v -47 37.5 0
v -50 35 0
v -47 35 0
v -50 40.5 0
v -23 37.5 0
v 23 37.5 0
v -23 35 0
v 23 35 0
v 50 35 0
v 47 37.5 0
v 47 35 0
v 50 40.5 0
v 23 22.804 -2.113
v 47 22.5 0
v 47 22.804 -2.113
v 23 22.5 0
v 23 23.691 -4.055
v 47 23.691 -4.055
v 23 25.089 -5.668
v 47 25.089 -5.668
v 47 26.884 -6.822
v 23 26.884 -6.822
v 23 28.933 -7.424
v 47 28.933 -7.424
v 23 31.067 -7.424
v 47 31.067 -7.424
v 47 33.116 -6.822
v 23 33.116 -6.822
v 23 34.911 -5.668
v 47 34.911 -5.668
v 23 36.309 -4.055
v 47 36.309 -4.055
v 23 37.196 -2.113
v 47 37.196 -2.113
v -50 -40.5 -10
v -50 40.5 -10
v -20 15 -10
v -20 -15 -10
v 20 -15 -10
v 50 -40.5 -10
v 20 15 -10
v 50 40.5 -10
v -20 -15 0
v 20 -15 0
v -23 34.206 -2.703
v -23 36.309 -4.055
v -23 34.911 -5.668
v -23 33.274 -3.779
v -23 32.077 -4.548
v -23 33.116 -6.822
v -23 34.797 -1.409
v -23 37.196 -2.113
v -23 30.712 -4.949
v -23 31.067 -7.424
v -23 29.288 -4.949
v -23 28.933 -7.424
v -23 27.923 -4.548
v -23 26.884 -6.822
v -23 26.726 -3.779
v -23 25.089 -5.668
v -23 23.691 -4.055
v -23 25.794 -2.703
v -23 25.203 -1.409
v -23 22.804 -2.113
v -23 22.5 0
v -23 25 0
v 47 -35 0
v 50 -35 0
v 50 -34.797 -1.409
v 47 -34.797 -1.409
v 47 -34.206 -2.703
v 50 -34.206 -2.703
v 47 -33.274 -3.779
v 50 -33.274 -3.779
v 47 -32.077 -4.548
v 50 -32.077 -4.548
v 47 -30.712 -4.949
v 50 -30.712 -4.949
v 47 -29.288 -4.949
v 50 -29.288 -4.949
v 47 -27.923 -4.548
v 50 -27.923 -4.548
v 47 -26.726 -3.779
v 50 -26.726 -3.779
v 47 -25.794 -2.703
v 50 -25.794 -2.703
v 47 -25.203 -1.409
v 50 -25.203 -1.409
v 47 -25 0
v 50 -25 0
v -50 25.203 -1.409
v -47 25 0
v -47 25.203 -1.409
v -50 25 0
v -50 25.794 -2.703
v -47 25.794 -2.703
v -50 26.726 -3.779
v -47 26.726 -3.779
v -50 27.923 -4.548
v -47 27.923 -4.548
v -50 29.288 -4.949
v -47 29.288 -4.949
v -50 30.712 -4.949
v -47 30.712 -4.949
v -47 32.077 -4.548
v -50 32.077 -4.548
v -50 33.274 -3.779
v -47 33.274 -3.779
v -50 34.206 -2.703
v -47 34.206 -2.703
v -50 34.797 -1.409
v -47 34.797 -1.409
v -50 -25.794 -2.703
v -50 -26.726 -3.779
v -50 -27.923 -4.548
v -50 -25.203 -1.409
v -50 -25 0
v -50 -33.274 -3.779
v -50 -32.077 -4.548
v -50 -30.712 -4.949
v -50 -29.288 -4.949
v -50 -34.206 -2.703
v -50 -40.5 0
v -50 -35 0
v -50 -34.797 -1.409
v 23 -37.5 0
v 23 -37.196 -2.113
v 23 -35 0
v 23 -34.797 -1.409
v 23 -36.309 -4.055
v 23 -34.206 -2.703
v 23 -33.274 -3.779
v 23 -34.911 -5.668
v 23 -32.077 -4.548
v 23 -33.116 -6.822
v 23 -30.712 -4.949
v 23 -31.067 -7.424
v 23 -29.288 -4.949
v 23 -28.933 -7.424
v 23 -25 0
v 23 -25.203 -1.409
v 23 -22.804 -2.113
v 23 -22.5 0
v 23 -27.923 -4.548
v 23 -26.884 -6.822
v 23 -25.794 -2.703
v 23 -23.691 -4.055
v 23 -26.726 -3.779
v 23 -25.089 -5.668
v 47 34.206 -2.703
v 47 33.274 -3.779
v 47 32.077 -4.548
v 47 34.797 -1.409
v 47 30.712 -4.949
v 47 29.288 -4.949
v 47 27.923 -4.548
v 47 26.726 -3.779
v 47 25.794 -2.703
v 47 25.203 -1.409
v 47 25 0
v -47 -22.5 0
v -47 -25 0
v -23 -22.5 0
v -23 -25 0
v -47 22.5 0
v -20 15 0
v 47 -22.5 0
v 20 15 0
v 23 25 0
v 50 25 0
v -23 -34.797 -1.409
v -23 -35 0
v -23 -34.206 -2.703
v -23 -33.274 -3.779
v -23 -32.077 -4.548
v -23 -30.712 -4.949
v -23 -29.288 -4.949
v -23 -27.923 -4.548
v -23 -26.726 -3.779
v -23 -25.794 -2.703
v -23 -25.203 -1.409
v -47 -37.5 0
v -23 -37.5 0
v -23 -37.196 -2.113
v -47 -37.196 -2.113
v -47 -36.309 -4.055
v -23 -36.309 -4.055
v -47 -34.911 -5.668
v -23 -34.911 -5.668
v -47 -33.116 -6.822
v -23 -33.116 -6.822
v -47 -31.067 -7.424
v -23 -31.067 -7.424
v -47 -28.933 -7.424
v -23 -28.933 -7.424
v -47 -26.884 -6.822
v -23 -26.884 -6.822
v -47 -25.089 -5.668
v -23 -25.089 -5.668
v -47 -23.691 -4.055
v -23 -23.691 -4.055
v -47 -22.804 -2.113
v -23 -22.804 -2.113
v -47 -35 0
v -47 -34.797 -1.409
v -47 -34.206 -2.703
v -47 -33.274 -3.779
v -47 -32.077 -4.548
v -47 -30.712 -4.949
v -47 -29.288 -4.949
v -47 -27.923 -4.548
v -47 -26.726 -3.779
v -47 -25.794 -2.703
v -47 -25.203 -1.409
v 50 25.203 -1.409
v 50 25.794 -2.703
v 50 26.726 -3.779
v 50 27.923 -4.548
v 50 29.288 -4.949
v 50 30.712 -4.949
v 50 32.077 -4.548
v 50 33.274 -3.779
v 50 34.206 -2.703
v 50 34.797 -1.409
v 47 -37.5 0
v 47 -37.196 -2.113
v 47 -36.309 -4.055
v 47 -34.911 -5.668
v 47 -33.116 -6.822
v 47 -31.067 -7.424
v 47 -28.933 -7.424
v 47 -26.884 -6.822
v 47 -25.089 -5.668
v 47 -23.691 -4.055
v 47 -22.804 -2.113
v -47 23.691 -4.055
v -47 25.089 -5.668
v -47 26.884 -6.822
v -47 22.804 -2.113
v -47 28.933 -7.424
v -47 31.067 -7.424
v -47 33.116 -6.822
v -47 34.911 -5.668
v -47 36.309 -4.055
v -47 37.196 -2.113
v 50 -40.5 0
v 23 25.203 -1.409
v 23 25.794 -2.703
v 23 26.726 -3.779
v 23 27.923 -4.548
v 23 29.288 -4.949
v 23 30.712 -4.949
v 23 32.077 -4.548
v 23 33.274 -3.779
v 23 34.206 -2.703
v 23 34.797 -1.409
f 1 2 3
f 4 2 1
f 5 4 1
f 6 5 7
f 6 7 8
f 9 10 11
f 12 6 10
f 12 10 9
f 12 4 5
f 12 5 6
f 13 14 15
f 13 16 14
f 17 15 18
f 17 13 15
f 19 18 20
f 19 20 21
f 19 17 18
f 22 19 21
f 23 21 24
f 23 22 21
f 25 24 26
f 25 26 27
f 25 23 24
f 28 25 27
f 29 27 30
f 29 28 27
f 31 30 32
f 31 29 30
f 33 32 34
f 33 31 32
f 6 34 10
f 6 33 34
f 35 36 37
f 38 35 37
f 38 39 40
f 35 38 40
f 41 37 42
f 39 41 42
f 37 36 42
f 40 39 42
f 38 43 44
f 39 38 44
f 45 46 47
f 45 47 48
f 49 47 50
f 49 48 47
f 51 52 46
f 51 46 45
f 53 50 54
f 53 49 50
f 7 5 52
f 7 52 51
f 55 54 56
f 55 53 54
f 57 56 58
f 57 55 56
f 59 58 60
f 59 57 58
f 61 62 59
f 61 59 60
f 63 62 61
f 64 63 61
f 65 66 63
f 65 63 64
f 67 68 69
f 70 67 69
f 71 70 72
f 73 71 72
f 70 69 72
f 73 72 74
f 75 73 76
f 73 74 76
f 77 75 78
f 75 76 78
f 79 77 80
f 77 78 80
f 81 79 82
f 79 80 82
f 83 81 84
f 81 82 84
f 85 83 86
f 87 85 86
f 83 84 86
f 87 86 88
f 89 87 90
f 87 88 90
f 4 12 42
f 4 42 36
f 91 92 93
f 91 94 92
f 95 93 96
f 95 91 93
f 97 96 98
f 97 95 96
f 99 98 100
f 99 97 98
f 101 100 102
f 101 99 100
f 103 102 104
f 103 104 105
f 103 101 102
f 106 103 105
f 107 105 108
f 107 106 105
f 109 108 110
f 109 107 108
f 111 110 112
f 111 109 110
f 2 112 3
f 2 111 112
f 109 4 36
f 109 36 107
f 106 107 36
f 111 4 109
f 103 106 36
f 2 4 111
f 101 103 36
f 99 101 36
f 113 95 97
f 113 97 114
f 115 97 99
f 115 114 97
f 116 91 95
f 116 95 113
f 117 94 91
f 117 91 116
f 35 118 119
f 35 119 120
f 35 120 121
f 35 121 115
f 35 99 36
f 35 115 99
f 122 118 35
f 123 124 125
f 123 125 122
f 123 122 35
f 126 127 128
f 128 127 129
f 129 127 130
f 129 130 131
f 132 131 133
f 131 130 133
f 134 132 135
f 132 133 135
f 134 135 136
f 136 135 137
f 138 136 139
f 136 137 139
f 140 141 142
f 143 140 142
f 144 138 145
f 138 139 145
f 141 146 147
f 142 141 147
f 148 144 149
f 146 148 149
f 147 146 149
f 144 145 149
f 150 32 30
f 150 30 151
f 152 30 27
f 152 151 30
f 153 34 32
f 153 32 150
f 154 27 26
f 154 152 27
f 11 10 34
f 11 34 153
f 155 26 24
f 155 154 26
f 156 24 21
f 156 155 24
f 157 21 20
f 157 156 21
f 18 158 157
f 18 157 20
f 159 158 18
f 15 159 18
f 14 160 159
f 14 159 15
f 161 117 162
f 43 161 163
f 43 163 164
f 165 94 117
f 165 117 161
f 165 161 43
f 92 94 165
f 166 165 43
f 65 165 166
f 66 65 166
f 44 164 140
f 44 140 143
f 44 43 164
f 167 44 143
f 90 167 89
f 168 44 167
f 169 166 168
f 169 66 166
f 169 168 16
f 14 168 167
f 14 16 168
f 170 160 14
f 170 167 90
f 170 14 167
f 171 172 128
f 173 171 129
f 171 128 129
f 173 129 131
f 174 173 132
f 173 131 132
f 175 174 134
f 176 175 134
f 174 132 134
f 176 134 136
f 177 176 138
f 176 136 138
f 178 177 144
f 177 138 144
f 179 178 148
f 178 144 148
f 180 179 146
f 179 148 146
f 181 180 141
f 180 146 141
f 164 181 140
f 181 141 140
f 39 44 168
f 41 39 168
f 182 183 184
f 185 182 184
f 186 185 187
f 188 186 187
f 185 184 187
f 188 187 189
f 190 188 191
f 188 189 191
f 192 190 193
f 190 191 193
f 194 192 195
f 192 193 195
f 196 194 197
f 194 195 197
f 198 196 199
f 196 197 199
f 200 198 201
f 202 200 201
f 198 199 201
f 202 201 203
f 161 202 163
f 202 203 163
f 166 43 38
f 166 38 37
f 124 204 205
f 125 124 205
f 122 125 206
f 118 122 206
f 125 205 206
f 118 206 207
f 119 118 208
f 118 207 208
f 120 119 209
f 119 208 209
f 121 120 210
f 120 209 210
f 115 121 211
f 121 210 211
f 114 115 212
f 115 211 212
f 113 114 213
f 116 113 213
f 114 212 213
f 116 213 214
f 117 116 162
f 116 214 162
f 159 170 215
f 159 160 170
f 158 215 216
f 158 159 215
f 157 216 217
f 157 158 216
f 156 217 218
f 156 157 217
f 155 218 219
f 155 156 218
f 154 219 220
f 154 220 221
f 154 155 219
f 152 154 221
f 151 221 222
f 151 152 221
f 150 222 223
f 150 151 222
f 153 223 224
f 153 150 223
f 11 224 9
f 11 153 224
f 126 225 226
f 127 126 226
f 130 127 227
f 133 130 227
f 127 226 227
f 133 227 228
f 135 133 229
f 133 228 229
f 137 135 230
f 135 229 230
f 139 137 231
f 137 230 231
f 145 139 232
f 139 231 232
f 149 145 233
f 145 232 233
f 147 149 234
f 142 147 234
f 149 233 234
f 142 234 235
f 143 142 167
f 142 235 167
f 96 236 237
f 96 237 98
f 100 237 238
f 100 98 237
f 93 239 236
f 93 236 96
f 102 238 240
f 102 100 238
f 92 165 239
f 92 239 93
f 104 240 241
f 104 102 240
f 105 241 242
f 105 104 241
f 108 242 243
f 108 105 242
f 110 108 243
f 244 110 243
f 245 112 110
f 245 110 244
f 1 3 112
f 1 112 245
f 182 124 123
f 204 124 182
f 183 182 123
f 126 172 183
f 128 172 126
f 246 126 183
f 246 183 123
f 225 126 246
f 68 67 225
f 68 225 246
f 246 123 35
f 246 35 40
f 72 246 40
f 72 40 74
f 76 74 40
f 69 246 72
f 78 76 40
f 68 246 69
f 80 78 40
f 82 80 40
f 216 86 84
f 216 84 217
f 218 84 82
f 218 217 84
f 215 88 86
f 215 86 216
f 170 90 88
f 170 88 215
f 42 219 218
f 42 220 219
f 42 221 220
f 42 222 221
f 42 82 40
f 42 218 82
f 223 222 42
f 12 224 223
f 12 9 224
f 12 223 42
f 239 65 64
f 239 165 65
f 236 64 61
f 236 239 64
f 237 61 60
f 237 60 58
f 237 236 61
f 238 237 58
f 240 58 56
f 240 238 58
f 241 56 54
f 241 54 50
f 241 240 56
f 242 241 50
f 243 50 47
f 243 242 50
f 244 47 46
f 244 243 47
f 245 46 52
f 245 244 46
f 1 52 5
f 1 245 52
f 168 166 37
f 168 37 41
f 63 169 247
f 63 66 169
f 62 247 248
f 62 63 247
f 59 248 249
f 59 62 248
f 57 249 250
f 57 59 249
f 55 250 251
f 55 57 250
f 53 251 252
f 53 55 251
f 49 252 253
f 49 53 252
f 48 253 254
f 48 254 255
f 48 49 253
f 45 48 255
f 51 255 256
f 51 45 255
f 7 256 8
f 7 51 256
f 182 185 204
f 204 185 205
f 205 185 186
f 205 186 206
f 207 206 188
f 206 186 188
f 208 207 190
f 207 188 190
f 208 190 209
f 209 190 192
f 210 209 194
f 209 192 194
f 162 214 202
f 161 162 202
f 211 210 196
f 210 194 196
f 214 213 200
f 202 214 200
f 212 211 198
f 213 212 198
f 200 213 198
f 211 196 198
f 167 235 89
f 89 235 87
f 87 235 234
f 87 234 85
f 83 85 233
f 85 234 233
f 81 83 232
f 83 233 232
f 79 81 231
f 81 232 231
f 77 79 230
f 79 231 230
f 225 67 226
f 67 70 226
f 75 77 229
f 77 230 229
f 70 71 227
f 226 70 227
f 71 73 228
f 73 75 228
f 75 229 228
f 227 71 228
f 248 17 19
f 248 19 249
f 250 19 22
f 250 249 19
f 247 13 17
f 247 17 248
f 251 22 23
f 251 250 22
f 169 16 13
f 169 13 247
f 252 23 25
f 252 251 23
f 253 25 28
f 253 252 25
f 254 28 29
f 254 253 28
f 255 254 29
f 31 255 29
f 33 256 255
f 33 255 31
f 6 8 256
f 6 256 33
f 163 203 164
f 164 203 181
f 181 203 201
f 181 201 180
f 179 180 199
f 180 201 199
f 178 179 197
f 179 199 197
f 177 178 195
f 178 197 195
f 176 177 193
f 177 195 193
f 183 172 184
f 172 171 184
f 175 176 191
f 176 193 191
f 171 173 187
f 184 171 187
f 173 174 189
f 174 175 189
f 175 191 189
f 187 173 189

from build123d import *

# Parameters (mm, degrees)
F0_W     = 100
F0_H     = 60
F0_W_2   = 40
F0_H_2   = 30
F1_DEPTH = 10
F2_DEPTH = 10.001


with BuildPart() as f1:
    # F0 (on Top) → F1 (new body)
    with BuildSketch(Plane.XY):
        Polygon((50, -35), (50, -30), (-50, -30), (-50, -35), (-47, -35), (-47, -37.5), (-23, -37.5), (-23, -35), (0, -35), (23, -35), (23, -37.5), (47, -37.5), (47, -35), align=None)
        Rectangle(F0_W, F0_H)
        Rectangle(F0_W_2, F0_H_2, mode=Mode.SUBTRACT)
        Polygon((50, 30), (50, 35), (47, 35), (47, 37.5), (23, 37.5), (23, 35), (0, 35), (-23, 35), (-23, 37.5), (-47, 37.5), (-47, 35), (-50, 35), (-50, 30), align=None)
        Polygon((50, -40.5), (50, -35), (47, -35), (47, -37.5), (23, -37.5), (23, -35), (0, -35), (-23, -35), (-23, -37.5), (-47, -37.5), (-47, -35), (-50, -35), (-50, -40.5), align=None)
        Polygon((50, 35), (50, 40.5), (-50, 40.5), (-50, 35), (-47, 35), (-47, 37.5), (-23, 37.5), (-23, 35), (0, 35), (23, 35), (23, 37.5), (47, 37.5), (47, 35), align=None)
        Rectangle(F0_W_2, F0_H_2)
    extrude(amount=-F1_DEPTH)

    # F0 (on Top) → F2 (cut, through all)
    with BuildSketch(Plane.XY):
        Rectangle(F0_W_2, F0_H_2)
    extrude(amount=-F2_DEPTH, mode=Mode.SUBTRACT)

    # F0 (on Top) → F3 (revolve, cut)
    with BuildSketch(Plane.XY):
        Polygon((50, 30), (50, 35), (47, 35), (47, 37.5), (23, 37.5), (23, 35), (0, 35), (-23, 35), (-23, 37.5), (-47, 37.5), (-47, 35), (-50, 35), (-50, 30), align=None)
    revolve(axis=Axis((0, 30, 0), (1, 0, 0)), mode=Mode.SUBTRACT)

    # F0 (on Top) → F4 (revolve, cut)
    with BuildSketch(Plane.XY):
        Polygon((50, -35), (50, -30), (-50, -30), (-50, -35), (-47, -35), (-47, -37.5), (-23, -37.5), (-23, -35), (0, -35), (23, -35), (23, -37.5), (47, -37.5), (47, -35), align=None)
    revolve(axis=Axis((0, -30, 0), (1, 0, 0)), mode=Mode.SUBTRACT)


solid = f1.part
